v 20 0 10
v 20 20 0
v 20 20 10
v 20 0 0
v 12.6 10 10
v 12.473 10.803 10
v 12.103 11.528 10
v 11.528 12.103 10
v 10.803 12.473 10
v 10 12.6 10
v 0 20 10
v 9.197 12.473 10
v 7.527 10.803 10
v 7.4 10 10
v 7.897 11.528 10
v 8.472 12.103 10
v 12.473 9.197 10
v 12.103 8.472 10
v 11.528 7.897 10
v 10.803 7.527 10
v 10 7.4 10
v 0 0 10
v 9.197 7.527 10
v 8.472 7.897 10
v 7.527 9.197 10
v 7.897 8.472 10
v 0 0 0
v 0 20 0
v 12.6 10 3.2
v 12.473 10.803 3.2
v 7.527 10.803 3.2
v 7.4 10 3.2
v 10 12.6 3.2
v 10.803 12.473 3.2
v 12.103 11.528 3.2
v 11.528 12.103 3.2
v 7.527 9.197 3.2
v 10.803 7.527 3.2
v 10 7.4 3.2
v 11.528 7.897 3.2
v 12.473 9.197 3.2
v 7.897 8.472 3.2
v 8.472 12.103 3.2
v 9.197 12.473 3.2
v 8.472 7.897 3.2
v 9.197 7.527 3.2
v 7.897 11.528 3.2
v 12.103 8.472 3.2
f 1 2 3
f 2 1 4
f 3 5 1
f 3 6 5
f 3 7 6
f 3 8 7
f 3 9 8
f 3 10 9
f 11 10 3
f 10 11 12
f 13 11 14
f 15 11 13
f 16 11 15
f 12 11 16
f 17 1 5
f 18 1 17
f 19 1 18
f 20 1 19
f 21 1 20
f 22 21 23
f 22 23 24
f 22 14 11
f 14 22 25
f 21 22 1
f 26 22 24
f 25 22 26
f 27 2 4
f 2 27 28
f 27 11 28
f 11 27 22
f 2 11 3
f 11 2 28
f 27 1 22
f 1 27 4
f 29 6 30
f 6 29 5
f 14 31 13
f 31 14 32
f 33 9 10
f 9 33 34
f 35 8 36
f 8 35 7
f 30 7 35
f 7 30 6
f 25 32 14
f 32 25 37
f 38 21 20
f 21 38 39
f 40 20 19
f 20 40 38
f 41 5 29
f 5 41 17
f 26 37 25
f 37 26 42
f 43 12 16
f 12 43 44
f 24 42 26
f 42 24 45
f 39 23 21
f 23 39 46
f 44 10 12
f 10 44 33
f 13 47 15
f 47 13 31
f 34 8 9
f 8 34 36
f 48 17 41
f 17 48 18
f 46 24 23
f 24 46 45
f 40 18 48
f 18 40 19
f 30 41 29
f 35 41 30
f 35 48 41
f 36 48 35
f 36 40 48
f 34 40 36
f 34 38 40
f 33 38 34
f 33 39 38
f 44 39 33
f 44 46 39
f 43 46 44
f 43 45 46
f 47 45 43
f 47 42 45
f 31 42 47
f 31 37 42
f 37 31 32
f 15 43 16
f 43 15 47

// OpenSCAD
$fn=20;

difference() {
   cube([20,20,10]);
   translate([10, 10, 10-6.8]) cylinder(d=5.2,h=6.9);
}
